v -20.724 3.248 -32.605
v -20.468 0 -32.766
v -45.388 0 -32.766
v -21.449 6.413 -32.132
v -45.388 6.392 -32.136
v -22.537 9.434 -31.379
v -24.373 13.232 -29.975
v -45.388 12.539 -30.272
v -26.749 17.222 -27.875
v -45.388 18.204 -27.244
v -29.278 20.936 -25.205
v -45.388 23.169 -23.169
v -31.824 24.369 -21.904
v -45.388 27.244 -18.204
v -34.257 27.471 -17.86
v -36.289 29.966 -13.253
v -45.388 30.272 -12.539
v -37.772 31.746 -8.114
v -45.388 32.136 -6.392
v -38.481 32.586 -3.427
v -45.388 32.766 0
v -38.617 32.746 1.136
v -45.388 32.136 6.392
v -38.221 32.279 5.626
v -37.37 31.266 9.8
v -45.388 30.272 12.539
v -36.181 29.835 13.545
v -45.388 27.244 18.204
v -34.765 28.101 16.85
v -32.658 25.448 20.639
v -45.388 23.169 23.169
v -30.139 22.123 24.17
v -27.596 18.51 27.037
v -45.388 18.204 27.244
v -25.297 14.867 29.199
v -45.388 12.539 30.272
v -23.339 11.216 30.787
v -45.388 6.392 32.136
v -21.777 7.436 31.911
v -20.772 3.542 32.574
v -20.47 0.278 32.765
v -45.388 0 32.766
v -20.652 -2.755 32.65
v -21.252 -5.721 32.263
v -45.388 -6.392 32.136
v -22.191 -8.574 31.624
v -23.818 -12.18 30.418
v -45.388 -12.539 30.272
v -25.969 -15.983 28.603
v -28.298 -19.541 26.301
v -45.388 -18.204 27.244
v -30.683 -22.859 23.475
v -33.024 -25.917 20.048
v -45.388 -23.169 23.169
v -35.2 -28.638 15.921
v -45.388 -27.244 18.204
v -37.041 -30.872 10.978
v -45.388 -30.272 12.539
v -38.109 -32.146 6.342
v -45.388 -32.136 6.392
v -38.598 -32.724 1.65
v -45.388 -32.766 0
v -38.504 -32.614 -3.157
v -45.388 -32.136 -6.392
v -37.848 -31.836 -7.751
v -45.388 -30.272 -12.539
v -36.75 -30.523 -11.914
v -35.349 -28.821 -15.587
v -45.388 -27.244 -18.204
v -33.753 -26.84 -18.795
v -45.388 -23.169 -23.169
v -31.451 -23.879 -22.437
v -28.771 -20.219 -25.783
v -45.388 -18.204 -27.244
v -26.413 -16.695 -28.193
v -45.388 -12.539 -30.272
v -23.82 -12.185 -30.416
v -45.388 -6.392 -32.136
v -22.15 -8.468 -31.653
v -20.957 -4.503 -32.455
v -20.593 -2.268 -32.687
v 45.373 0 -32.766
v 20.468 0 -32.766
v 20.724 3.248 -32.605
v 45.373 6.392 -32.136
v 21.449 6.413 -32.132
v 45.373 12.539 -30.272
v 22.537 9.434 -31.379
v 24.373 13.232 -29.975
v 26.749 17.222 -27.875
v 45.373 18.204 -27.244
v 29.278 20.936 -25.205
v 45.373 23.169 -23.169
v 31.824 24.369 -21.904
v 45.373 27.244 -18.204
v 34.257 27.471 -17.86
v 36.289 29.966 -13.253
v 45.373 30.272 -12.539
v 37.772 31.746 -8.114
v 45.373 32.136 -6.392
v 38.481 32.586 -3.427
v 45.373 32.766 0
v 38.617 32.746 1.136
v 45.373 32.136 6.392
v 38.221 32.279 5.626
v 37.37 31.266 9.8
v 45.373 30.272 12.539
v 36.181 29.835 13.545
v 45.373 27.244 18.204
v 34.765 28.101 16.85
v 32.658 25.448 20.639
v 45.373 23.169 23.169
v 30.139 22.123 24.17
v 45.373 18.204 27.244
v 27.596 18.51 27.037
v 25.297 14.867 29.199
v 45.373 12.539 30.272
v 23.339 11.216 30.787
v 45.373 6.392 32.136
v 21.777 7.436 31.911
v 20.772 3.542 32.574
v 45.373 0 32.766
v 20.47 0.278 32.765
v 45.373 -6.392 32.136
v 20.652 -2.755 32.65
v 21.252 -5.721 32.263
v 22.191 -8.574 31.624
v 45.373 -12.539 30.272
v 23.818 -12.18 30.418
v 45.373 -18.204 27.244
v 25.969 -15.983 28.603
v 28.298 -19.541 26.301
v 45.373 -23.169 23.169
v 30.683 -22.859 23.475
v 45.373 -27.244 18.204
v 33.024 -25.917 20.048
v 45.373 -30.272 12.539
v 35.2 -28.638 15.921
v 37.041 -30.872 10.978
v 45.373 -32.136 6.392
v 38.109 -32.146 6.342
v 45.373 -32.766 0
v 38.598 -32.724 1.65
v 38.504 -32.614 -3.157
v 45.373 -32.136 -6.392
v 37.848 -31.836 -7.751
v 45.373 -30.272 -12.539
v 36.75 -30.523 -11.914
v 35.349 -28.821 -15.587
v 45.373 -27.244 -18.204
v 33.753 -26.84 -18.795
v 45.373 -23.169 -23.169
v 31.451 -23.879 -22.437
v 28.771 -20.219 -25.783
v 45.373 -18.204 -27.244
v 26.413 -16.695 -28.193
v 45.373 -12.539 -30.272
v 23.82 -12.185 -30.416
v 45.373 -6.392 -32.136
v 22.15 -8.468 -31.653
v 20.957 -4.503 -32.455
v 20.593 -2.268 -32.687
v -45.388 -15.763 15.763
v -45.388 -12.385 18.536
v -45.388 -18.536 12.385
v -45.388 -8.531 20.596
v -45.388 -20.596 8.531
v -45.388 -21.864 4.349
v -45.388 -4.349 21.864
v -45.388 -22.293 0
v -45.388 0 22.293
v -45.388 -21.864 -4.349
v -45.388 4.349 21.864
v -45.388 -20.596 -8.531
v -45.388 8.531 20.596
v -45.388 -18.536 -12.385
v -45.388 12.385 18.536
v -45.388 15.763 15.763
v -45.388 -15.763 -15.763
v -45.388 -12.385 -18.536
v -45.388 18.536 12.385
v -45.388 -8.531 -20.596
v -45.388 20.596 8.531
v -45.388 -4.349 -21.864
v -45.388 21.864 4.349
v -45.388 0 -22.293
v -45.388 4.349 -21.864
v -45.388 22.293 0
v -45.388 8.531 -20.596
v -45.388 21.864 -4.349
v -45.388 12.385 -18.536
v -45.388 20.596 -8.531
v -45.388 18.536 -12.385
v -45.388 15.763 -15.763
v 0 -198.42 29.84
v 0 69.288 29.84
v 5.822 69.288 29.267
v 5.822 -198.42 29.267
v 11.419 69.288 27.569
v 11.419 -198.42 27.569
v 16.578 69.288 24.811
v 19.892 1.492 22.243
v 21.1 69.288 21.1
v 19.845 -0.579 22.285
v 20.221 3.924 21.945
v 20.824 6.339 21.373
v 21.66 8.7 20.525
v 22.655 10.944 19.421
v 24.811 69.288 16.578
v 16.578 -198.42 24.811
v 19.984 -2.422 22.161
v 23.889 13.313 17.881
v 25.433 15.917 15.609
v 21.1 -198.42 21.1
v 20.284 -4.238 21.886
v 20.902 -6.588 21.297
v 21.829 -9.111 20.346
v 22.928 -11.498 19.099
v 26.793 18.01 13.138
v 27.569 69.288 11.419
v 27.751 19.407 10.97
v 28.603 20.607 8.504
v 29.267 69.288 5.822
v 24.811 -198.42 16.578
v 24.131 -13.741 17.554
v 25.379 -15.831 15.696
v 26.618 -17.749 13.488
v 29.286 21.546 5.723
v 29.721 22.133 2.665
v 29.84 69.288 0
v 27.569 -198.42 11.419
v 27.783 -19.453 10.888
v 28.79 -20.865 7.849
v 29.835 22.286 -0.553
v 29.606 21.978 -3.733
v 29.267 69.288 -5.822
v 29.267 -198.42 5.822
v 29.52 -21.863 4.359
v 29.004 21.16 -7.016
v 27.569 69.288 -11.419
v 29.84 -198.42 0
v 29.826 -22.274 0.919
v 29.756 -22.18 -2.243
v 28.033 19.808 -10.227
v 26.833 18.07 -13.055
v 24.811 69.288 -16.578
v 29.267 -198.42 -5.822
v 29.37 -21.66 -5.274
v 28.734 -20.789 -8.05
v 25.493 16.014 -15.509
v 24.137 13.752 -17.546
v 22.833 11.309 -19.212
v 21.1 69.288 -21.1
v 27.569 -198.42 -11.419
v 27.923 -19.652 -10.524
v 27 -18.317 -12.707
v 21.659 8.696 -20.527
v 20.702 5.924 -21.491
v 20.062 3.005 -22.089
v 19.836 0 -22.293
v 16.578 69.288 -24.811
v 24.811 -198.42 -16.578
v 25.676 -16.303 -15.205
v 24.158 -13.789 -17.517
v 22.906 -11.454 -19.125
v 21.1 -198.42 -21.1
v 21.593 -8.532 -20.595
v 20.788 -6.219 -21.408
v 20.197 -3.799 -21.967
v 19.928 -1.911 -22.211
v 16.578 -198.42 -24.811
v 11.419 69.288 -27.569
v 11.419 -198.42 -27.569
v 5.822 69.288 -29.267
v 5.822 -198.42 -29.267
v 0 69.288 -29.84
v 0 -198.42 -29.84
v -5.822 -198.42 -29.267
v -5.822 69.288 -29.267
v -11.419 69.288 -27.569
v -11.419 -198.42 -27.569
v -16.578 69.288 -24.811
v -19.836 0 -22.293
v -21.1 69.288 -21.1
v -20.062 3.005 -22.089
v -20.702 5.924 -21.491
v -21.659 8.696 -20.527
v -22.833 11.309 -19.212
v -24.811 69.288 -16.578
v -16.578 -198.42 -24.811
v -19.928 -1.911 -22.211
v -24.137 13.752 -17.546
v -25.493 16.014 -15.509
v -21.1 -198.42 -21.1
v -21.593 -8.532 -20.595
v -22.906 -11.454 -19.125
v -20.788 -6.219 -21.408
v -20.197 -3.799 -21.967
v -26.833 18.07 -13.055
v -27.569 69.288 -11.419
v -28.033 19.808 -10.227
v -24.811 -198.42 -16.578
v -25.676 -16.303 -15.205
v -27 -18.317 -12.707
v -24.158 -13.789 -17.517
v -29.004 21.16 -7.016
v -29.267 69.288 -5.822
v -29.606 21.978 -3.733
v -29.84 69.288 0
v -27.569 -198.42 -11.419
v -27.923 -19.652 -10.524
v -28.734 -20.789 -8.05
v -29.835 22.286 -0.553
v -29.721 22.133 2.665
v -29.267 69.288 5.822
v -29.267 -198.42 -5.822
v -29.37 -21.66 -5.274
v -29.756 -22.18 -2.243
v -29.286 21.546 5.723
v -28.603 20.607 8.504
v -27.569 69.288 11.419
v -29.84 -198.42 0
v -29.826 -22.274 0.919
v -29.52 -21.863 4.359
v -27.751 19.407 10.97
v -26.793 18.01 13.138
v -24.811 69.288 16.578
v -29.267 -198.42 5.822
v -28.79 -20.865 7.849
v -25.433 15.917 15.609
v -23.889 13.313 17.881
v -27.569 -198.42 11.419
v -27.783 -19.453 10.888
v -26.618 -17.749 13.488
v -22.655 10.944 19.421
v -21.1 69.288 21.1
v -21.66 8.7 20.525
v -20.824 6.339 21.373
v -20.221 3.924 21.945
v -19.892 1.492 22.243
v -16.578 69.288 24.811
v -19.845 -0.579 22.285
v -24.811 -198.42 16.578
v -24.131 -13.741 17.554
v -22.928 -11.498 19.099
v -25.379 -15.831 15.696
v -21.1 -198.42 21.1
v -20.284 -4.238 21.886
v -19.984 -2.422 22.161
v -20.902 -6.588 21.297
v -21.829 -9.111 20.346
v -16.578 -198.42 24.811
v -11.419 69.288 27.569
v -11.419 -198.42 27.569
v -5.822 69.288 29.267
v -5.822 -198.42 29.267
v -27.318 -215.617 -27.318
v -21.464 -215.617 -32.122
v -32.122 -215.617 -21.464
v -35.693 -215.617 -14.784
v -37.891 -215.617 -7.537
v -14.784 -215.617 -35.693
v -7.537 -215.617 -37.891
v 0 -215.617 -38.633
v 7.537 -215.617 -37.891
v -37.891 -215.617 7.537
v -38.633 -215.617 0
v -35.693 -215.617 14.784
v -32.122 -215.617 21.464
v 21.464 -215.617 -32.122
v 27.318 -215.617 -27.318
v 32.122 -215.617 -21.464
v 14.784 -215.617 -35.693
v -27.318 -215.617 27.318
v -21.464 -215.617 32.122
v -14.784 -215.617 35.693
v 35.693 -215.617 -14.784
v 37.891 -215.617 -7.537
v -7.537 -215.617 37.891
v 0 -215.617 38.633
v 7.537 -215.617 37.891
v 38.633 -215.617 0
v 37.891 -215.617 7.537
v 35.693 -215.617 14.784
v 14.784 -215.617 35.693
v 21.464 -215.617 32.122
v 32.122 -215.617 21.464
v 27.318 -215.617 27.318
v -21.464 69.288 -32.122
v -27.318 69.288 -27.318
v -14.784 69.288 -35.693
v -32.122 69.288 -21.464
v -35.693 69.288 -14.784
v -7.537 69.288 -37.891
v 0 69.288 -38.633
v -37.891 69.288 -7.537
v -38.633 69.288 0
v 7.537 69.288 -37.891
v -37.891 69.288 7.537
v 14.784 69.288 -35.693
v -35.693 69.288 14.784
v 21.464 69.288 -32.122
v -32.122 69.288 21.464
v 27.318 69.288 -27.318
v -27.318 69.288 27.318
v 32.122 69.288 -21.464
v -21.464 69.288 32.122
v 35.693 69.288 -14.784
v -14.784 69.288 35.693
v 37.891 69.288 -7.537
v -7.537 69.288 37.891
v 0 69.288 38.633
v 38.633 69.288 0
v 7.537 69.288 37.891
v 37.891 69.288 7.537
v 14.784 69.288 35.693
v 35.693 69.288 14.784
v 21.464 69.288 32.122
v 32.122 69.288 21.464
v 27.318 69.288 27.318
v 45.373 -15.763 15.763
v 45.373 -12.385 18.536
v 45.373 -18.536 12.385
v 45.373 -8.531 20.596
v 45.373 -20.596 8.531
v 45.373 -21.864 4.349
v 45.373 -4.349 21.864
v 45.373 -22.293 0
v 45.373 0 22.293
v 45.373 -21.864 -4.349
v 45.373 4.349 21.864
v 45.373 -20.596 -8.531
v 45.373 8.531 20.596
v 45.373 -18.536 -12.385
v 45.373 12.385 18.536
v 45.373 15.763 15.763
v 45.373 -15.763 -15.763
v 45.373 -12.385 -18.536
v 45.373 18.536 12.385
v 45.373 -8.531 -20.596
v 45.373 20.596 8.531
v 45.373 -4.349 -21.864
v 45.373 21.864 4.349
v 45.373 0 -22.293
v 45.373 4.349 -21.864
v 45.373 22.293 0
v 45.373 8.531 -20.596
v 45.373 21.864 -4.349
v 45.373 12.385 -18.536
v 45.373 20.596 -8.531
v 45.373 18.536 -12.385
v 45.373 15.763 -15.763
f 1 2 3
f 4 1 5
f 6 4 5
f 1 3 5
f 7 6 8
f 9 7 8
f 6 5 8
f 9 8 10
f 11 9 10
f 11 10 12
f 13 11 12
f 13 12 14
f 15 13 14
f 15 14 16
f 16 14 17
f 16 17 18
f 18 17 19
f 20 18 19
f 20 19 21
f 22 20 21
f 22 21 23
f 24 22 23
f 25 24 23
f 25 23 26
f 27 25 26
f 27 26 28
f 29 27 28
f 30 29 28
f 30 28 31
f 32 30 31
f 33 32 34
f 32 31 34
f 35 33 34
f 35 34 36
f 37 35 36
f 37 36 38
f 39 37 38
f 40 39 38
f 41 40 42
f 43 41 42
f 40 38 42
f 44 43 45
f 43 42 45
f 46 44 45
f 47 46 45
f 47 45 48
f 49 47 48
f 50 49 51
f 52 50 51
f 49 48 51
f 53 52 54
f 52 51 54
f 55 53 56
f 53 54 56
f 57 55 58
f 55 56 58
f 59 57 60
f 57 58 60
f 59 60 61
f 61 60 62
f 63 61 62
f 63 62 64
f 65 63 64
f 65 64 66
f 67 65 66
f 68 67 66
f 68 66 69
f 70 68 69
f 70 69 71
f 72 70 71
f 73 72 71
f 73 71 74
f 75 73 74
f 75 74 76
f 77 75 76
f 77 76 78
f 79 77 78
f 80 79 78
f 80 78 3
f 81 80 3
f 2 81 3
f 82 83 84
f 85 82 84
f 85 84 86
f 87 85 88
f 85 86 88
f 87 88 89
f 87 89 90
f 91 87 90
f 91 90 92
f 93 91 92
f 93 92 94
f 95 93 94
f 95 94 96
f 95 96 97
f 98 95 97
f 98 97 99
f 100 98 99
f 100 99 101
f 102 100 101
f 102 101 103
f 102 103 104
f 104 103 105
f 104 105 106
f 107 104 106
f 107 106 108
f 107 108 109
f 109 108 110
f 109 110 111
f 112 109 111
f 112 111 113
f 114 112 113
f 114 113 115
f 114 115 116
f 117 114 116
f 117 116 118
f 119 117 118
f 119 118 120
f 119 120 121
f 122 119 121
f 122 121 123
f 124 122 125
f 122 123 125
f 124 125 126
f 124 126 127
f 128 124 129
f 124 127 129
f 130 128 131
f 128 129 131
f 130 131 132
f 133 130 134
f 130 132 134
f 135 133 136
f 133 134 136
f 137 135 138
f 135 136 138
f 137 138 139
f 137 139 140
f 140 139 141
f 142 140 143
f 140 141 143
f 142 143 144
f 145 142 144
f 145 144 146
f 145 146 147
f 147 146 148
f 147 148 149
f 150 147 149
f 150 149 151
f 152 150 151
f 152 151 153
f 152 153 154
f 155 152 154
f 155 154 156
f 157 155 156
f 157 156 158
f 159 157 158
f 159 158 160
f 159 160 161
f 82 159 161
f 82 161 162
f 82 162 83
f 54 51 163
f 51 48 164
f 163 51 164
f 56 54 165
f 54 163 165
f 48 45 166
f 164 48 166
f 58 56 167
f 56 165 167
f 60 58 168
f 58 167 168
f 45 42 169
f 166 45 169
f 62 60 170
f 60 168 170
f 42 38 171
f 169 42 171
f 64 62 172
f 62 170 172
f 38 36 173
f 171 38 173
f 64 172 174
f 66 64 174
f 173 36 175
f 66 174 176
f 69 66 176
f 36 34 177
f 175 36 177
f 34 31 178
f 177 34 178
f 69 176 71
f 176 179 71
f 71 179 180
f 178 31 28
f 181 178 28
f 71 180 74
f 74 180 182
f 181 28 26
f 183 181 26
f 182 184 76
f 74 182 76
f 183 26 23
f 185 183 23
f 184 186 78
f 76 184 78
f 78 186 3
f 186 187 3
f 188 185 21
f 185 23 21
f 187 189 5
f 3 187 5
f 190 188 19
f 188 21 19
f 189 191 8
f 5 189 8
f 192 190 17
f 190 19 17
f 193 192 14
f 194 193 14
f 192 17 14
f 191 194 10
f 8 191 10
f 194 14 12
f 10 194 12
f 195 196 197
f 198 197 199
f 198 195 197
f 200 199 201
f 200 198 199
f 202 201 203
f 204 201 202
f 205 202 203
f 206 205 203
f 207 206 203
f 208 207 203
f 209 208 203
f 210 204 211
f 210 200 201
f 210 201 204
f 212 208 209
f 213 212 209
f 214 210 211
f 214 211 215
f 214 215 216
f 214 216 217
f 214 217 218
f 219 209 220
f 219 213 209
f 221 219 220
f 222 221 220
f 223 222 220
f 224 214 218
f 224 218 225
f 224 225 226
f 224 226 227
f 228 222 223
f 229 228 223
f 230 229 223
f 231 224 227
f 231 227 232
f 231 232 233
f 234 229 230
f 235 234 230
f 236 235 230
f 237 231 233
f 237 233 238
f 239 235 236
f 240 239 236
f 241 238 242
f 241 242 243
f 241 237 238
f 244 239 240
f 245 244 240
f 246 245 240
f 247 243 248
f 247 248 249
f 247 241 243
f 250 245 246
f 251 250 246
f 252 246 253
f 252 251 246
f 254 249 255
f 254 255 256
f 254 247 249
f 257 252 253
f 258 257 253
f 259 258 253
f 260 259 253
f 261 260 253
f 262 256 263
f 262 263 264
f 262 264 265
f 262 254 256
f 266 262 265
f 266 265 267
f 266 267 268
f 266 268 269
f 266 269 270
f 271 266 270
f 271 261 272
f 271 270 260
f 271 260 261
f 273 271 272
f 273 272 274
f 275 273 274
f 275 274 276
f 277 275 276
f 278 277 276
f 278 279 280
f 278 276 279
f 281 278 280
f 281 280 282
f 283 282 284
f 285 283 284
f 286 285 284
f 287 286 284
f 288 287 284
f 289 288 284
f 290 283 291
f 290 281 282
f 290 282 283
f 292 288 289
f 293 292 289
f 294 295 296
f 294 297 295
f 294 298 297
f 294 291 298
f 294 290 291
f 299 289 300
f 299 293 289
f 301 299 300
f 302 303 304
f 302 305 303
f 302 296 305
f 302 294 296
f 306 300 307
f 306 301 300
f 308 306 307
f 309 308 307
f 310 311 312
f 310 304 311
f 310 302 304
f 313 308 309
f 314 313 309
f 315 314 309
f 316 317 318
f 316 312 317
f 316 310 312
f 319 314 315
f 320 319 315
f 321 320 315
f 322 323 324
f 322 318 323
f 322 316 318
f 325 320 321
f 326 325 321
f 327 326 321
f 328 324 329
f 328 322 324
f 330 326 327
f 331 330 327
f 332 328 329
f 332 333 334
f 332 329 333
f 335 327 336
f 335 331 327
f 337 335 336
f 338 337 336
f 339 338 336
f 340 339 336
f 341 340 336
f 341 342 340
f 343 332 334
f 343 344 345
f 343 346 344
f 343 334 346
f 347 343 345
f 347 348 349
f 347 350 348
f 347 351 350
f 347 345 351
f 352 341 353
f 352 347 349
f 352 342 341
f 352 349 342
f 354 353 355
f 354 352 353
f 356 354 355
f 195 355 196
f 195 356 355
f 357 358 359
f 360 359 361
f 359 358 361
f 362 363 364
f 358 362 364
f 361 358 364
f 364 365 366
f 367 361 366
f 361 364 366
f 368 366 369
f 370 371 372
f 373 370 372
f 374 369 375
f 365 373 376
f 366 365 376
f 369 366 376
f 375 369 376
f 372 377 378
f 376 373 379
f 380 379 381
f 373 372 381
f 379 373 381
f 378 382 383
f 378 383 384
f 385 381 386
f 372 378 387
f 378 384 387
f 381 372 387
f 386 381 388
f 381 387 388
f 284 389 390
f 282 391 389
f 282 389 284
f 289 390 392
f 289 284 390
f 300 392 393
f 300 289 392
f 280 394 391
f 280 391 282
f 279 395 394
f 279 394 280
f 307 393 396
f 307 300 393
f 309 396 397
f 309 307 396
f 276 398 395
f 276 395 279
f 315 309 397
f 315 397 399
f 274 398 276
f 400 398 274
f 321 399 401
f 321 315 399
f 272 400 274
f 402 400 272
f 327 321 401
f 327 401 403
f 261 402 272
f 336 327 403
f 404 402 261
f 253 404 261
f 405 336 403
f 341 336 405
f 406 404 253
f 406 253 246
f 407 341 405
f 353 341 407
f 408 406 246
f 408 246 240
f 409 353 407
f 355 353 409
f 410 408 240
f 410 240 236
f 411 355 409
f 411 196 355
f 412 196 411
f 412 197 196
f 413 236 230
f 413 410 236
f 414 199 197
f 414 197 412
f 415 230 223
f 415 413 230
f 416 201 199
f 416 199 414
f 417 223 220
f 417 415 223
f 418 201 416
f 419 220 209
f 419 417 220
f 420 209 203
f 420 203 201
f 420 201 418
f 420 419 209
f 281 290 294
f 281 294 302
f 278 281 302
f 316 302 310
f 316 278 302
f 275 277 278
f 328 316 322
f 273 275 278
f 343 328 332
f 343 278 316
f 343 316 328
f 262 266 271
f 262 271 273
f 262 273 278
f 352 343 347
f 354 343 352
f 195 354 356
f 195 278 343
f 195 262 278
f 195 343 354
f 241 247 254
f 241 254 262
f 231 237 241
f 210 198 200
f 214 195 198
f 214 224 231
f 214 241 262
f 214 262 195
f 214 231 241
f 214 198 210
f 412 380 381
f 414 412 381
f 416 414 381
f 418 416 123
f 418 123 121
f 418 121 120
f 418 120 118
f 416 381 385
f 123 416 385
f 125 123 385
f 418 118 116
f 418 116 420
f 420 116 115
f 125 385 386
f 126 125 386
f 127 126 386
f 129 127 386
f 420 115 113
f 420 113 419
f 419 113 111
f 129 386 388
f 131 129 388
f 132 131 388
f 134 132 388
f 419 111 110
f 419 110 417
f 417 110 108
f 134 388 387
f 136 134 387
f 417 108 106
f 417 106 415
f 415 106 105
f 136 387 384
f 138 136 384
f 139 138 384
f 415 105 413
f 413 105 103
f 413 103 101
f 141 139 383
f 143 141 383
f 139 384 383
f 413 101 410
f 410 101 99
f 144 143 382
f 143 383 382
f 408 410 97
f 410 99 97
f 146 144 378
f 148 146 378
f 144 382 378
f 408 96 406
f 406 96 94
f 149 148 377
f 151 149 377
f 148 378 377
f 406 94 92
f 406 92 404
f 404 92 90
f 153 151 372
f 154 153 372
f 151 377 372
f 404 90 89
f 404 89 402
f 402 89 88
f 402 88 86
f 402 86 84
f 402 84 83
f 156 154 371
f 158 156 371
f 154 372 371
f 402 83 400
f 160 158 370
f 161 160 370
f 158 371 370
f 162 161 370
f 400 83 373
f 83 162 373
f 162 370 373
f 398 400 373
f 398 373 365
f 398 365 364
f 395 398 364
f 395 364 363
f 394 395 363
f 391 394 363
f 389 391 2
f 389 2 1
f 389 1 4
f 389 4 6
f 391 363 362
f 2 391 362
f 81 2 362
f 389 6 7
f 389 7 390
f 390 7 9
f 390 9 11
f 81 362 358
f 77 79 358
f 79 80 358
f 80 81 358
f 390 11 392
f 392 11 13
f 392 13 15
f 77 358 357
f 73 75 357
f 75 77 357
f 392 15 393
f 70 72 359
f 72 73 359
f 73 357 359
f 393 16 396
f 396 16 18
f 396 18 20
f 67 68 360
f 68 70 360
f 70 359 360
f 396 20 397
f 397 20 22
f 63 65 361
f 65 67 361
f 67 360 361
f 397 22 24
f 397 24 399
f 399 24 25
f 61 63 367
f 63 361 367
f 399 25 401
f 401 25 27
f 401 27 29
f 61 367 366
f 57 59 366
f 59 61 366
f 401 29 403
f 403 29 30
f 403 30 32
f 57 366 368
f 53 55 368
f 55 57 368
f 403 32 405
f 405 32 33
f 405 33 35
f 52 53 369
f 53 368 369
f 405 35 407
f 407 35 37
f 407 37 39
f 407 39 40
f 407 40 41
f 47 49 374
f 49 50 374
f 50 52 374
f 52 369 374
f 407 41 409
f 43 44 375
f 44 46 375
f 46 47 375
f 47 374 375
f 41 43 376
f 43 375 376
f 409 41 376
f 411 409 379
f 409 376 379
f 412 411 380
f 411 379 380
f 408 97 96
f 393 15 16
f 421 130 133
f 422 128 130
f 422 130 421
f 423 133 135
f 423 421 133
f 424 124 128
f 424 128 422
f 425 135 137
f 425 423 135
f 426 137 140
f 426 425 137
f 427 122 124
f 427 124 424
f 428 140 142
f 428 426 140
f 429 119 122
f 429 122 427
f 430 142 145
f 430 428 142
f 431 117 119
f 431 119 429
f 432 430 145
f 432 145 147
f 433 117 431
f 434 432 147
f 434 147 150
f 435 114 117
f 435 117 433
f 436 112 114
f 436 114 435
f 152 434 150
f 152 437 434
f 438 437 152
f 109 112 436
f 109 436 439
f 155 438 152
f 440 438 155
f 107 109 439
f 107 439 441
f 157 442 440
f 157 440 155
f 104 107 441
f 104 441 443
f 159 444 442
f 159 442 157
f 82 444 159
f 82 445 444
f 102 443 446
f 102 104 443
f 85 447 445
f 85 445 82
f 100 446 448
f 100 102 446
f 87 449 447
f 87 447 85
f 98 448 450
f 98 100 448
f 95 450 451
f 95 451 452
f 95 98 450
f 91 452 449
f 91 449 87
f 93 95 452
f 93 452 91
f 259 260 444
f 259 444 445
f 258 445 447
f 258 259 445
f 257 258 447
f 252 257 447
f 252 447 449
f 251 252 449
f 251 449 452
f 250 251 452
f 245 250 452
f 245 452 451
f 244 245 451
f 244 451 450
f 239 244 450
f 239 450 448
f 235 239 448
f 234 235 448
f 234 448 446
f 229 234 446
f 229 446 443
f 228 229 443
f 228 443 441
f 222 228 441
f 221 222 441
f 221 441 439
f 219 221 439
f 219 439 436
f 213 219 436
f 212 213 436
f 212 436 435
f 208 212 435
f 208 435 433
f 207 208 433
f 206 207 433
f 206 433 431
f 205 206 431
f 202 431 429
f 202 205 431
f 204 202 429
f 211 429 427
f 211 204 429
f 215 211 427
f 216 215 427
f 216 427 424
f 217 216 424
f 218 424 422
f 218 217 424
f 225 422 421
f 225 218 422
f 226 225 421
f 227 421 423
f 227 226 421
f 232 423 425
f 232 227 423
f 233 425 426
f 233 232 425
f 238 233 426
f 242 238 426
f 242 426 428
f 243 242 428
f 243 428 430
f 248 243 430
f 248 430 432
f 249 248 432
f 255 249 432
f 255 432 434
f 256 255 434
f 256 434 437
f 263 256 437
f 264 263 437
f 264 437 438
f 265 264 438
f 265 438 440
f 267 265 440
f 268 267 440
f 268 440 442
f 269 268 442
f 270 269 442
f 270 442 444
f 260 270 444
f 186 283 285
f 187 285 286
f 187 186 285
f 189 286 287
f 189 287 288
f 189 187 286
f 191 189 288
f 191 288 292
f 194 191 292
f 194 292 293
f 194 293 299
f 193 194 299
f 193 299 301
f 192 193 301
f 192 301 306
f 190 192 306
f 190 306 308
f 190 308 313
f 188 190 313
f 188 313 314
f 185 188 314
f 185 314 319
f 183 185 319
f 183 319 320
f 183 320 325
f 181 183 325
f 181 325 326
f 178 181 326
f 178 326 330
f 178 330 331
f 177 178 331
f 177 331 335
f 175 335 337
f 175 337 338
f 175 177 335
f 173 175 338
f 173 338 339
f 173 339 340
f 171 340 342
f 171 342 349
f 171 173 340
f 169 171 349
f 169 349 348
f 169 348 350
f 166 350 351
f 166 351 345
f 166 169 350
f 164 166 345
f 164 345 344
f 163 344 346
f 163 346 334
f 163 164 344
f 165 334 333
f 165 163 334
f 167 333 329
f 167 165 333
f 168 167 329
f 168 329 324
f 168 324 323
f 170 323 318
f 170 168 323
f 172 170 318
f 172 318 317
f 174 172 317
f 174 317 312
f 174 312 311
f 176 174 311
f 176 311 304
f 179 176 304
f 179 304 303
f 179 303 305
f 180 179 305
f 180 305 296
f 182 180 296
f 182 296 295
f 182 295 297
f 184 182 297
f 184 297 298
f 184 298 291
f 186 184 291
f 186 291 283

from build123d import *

# Parameters (mm, degrees)
BOSS_EXTRUDE1_DEPTH      = 45.372782
BOSS_EXTRUDE1_DEPTH_BACK = 45.388276
SKETCH1_R                = 32.766
BOSS_EXTRUDE2_DEPTH      = 69.287898
BOSS_EXTRUDE2_DEPTH_BACK = 215.617298
SKETCH2_R                = 38.6334
CUT_EXTRUDE1_DEPTH       = 224.703943753
CUT_EXTRUDE1_DEPTH_BACK  = 224.703943753
SKETCH3_R                = 22.292818
CUT_EXTRUDE2_DEPTH       = 224.703943753
CUT_EXTRUDE2_DEPTH_BACK  = 198.41972
SKETCH4_R                = 29.840301


with BuildPart() as part:
    # Sketch1 → Boss-Extrude1 (new, two sides: drawn at the far end of the back side and taken through both)
    with BuildSketch(Plane(origin=(0, 0, 0), x_dir=(0, 0, -1), z_dir=(1, 0, 0)).offset(-BOSS_EXTRUDE1_DEPTH_BACK)):
        Circle(SKETCH1_R)
    extrude(amount=BOSS_EXTRUDE1_DEPTH + BOSS_EXTRUDE1_DEPTH_BACK)

    # Sketch2 → Boss-Extrude2 (add, two sides: drawn at the far end of the back side and taken through both)
    with BuildSketch(Plane(origin=(0, 0, 0), x_dir=(1, 0, 0), z_dir=(0, 1, 0)).offset(-BOSS_EXTRUDE2_DEPTH_BACK)):
        with Locations(Location((0, 0, 0), (0, 0, 270))):
            Circle(SKETCH2_R)
    extrude(amount=BOSS_EXTRUDE2_DEPTH + BOSS_EXTRUDE2_DEPTH_BACK)

    # Sketch3 → Cut-Extrude1 (cut, two sides: drawn at the far end of the back side and taken through both)
    with BuildSketch(Plane(origin=(0, 0, 0), x_dir=(0, 0, -1), z_dir=(1, 0, 0)).offset(-CUT_EXTRUDE1_DEPTH_BACK)):
        Circle(SKETCH3_R)
    extrude(amount=CUT_EXTRUDE1_DEPTH + CUT_EXTRUDE1_DEPTH_BACK, mode=Mode.SUBTRACT)

    # Sketch4 → Cut-Extrude2 (cut, two sides: drawn at the far end of the back side and taken through both)
    with BuildSketch(Plane(origin=(0, 0, 0), x_dir=(1, 0, 0), z_dir=(0, 1, 0)).offset(-CUT_EXTRUDE2_DEPTH_BACK)):
        with Locations(Location((0, 0, 0), (0, 0, 270))):
            Circle(SKETCH4_R)
    extrude(amount=CUT_EXTRUDE2_DEPTH + CUT_EXTRUDE2_DEPTH_BACK, mode=Mode.SUBTRACT)


solid = part.part
